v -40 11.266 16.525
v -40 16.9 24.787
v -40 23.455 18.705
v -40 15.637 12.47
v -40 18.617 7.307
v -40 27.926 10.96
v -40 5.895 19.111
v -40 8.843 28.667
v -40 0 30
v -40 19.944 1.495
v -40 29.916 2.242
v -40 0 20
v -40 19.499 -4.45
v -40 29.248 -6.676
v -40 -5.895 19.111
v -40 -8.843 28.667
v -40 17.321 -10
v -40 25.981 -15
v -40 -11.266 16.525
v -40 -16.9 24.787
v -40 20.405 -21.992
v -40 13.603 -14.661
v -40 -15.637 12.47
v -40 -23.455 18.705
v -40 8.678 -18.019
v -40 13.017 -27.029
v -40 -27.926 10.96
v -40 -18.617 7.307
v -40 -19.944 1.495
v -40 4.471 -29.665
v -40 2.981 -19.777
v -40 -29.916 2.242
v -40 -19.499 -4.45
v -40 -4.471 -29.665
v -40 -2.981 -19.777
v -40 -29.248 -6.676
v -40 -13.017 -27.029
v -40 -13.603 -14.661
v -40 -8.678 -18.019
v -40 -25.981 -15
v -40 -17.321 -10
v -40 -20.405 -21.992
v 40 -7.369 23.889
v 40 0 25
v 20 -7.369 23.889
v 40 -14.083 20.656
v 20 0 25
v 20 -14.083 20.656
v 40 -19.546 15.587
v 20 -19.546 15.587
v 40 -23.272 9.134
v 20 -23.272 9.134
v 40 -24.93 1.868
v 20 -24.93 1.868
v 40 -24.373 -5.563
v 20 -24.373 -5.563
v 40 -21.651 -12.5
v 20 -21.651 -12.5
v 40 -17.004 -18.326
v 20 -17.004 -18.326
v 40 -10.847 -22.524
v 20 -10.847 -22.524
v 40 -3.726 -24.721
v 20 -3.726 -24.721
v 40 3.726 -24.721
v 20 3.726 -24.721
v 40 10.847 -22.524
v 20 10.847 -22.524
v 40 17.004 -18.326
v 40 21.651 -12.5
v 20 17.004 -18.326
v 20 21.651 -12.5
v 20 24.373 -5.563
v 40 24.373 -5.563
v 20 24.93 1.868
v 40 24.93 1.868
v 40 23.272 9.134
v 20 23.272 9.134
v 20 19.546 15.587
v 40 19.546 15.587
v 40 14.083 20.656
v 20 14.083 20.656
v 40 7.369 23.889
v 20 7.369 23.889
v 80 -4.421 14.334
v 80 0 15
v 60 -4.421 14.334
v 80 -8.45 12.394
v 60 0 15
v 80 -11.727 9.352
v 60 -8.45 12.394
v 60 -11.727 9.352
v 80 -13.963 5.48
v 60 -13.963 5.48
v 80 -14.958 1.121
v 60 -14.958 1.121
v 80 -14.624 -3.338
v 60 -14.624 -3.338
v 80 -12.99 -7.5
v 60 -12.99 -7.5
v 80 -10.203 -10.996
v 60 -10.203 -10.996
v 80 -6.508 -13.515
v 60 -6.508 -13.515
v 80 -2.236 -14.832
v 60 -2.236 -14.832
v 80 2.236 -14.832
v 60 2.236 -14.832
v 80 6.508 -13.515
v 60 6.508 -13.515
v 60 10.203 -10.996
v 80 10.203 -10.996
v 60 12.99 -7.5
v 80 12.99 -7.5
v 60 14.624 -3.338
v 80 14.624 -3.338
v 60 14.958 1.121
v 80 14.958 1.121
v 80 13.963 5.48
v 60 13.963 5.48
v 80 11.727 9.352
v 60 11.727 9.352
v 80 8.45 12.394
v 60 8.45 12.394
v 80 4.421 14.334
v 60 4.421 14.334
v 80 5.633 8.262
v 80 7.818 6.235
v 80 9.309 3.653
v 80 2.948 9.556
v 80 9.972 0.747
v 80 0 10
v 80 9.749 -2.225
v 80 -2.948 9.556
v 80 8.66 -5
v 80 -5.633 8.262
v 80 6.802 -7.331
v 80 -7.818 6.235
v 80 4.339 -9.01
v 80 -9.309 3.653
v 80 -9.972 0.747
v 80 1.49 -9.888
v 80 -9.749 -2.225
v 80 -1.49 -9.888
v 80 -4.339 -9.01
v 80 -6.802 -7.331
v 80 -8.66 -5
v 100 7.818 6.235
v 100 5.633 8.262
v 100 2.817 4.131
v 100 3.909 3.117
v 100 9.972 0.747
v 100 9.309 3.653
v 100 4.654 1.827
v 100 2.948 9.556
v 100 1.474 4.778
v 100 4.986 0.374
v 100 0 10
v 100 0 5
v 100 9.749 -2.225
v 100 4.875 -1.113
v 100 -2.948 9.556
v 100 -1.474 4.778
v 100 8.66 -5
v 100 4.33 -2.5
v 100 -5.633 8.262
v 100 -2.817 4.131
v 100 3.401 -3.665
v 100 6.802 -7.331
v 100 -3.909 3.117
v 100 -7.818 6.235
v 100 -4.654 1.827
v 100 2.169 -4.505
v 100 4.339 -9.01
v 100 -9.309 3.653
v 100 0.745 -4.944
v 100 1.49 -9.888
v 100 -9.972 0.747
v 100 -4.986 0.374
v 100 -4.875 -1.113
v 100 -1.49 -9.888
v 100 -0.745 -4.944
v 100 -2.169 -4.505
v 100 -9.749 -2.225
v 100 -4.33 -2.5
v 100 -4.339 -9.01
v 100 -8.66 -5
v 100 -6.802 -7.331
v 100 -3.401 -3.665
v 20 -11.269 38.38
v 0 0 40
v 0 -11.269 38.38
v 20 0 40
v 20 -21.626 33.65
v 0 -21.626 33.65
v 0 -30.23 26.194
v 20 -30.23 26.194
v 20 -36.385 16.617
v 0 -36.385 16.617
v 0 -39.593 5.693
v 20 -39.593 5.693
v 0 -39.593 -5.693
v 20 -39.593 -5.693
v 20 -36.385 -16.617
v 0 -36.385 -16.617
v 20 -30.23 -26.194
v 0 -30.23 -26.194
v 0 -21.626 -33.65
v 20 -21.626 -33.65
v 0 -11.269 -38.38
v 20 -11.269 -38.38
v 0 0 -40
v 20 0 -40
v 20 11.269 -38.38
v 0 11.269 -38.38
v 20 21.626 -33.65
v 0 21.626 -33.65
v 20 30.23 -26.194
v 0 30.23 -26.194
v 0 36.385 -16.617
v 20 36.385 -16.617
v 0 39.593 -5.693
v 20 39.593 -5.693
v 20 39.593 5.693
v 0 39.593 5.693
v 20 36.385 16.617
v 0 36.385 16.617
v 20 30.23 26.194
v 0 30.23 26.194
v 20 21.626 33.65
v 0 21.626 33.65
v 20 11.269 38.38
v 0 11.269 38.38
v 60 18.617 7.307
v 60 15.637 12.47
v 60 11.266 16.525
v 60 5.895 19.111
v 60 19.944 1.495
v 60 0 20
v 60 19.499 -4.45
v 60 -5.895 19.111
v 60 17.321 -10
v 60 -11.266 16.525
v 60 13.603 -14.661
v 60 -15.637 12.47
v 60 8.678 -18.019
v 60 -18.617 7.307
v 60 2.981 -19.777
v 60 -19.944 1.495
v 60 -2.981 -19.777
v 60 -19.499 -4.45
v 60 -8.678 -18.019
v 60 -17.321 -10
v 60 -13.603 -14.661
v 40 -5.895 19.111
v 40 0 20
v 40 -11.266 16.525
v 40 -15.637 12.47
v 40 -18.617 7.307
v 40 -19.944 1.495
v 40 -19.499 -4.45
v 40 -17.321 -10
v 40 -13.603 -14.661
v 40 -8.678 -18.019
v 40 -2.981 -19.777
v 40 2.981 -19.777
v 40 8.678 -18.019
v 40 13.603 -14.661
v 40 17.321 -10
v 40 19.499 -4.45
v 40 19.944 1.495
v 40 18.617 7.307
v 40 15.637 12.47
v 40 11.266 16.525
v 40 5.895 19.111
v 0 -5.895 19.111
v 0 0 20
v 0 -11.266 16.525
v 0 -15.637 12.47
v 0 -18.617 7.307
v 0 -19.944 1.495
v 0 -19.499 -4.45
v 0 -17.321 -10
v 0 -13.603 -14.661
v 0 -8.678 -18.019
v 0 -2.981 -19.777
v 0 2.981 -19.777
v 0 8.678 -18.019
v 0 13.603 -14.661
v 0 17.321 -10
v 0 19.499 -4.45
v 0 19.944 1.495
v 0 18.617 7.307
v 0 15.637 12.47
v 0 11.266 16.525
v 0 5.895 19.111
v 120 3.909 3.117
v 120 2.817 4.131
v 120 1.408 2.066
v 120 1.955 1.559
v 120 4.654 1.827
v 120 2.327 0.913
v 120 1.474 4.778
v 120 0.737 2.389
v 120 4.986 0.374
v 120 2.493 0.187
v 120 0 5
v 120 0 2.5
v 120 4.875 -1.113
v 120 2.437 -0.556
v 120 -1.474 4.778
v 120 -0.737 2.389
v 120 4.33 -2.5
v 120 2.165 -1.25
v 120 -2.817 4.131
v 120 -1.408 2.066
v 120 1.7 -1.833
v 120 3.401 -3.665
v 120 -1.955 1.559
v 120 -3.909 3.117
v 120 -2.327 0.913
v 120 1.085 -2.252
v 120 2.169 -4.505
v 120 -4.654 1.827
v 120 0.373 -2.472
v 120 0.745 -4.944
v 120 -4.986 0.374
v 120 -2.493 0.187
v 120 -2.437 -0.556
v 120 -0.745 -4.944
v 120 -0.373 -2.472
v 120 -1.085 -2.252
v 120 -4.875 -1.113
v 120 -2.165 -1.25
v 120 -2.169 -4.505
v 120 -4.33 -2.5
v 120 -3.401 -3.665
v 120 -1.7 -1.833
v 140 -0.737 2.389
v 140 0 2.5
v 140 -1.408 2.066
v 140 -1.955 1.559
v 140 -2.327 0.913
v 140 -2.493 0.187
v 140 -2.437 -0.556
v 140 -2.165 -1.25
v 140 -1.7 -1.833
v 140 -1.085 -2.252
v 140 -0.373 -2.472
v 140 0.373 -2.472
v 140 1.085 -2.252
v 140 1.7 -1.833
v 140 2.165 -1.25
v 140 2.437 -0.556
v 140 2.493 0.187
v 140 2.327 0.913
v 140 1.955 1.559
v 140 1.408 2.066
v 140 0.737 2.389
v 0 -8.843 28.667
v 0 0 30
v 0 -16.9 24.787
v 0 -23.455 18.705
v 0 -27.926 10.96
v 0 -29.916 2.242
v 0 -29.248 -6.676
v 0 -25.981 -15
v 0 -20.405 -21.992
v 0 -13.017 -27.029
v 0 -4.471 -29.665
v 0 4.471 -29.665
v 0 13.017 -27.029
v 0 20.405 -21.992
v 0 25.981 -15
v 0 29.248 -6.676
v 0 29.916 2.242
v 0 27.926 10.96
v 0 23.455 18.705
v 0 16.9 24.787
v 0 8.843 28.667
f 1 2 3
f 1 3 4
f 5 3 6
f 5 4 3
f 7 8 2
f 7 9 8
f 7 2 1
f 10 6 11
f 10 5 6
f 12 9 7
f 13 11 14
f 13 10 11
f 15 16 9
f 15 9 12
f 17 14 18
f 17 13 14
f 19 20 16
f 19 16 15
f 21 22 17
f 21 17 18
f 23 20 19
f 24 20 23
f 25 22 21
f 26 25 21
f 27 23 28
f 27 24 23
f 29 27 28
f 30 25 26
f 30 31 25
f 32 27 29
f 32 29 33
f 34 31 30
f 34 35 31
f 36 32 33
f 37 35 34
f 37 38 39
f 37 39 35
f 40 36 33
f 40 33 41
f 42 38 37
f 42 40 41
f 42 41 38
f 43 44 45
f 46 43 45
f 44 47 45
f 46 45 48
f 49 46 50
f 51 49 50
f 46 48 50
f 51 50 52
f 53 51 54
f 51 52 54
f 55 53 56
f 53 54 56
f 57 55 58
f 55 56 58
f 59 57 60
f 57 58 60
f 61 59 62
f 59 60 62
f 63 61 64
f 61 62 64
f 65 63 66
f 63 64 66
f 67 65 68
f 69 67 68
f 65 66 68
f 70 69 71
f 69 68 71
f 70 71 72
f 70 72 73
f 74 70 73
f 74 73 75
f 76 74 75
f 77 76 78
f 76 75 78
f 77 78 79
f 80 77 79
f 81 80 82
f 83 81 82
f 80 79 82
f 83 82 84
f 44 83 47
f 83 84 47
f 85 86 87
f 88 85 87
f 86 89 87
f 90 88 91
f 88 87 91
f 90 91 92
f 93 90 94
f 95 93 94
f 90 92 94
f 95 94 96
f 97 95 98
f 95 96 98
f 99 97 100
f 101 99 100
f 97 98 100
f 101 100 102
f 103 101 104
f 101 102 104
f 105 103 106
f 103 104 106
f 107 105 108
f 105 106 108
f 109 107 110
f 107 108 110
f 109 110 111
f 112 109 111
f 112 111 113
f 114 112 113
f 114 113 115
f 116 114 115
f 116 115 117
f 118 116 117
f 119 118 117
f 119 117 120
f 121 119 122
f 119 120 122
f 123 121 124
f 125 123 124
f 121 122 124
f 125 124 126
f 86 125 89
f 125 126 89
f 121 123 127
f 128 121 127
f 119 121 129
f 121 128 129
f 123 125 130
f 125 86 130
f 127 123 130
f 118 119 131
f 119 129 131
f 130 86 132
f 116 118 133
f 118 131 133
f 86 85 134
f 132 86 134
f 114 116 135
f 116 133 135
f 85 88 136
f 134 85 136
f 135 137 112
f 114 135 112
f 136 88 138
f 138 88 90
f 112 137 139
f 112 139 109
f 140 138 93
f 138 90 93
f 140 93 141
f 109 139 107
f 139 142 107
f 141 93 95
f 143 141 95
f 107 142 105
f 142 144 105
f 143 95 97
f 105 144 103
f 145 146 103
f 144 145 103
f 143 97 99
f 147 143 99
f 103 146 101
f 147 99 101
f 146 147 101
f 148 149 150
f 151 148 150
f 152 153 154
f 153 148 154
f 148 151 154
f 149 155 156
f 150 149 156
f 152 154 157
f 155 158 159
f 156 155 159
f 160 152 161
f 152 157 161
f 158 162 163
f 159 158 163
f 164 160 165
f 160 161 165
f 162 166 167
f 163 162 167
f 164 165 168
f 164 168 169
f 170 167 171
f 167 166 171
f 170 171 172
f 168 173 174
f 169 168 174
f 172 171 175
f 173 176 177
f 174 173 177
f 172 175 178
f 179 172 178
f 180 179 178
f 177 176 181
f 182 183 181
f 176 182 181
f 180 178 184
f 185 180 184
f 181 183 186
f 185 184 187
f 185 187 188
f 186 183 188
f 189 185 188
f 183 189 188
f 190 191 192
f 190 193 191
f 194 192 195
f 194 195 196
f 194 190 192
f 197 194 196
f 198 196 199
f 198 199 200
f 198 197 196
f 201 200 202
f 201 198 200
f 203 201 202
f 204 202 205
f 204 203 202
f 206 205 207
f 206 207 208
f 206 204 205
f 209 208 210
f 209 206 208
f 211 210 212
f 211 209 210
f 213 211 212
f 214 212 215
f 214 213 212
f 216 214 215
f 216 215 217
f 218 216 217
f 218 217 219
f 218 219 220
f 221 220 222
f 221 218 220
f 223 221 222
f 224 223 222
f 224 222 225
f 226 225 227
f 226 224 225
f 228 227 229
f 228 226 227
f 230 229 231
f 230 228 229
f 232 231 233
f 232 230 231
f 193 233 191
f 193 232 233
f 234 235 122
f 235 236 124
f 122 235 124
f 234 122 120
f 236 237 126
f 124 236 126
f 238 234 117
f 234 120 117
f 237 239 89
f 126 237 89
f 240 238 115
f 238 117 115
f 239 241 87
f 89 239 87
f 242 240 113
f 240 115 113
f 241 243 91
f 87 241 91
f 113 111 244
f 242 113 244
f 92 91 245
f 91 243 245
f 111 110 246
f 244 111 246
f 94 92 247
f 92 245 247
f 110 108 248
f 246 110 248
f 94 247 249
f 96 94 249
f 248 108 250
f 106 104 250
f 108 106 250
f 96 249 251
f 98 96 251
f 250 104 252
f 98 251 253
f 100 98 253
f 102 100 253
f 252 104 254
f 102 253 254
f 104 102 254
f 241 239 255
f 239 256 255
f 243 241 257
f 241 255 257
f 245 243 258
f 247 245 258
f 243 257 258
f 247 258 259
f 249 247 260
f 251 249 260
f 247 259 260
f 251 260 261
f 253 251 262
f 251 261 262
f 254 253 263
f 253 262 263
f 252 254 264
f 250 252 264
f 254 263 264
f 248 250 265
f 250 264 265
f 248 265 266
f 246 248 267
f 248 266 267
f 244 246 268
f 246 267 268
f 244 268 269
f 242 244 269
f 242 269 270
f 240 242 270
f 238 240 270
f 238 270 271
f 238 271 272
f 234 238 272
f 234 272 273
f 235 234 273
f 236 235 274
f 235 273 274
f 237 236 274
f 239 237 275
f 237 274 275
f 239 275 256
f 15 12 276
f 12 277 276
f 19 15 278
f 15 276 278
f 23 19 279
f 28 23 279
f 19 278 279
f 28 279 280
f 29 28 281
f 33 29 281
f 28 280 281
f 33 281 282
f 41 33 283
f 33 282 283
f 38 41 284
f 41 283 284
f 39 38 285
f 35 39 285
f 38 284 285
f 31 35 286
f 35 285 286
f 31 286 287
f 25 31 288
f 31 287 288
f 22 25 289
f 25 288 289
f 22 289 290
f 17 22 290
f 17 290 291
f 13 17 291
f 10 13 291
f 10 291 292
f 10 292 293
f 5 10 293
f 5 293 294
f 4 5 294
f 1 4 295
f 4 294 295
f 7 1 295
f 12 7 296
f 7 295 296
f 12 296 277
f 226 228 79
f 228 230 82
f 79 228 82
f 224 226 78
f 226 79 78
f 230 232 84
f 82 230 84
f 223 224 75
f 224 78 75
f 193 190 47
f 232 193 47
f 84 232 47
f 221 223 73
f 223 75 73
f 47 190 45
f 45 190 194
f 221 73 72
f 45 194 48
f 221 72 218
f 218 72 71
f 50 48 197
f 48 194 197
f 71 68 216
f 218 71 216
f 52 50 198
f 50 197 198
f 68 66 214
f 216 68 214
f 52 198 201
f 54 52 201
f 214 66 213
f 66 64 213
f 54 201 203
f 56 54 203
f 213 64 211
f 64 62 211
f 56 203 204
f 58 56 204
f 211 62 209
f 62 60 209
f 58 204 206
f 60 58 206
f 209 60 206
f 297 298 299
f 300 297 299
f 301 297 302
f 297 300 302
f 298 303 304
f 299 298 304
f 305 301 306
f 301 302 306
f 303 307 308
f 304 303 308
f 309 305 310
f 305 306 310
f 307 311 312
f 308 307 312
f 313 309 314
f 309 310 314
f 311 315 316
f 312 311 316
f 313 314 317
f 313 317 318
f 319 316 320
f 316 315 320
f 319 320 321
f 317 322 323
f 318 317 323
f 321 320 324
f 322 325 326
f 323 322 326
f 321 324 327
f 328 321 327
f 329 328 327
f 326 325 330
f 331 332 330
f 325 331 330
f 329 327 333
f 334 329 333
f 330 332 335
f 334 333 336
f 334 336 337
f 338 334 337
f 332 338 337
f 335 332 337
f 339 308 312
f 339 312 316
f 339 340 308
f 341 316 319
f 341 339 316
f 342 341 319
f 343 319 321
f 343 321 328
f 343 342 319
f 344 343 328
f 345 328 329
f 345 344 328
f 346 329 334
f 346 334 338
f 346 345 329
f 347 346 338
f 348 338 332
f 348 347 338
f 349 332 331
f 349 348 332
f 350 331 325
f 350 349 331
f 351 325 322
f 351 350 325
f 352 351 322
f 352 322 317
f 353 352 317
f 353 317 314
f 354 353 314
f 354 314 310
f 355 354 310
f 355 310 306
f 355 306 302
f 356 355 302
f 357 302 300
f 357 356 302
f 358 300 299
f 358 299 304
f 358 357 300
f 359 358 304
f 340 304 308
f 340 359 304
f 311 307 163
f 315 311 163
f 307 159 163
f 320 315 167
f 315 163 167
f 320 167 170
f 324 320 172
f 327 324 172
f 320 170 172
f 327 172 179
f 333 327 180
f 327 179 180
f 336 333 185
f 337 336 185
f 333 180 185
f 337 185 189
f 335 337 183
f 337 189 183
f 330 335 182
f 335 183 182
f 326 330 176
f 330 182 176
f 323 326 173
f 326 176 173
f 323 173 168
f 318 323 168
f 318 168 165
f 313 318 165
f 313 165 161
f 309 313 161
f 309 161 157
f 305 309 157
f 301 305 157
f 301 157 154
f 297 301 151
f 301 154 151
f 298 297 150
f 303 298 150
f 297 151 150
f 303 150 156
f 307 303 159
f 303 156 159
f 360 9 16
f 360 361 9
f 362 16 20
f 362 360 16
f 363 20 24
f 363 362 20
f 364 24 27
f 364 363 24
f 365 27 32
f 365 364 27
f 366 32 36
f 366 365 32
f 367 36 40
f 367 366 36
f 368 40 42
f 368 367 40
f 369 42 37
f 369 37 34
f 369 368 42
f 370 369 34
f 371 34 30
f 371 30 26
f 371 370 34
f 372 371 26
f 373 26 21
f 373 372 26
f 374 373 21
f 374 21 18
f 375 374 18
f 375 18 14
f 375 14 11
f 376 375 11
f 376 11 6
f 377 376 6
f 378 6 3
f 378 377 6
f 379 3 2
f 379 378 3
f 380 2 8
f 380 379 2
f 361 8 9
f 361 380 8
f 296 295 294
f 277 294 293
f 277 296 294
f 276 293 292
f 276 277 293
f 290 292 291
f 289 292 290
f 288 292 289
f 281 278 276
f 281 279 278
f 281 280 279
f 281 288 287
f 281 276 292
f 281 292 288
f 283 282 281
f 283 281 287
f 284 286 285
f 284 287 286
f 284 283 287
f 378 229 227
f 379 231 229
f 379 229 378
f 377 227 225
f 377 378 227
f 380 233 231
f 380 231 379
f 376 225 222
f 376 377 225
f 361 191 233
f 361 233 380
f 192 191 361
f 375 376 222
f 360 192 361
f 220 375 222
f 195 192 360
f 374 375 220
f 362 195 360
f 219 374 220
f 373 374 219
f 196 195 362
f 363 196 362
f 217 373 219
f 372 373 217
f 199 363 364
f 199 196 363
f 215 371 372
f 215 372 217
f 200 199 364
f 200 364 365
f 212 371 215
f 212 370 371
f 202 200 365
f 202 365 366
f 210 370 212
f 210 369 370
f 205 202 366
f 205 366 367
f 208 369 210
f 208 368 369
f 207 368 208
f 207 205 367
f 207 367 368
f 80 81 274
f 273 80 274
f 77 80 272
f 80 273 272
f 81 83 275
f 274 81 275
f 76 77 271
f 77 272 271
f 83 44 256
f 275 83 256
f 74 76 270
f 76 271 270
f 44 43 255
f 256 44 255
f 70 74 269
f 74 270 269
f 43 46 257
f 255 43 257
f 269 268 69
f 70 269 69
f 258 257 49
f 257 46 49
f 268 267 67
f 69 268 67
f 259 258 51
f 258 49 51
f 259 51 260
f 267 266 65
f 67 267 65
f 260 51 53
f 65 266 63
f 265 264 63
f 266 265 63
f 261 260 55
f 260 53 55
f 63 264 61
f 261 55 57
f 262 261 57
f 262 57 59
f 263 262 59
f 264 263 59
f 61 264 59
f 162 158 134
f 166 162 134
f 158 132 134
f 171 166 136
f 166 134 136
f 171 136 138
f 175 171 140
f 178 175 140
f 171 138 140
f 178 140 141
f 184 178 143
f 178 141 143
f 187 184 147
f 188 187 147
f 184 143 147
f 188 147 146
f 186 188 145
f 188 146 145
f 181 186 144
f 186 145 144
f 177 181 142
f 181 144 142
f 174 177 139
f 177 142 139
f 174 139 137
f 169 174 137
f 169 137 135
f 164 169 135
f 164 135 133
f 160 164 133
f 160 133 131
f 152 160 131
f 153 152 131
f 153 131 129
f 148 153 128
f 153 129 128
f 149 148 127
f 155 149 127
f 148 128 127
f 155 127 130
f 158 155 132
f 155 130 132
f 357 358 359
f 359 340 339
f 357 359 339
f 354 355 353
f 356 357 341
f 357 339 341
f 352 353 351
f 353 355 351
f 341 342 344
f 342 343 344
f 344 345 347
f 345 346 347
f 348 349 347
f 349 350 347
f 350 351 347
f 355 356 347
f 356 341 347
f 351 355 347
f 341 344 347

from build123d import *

# Parameters (mm, degrees)
SKETCH_1_W   = 40
SKETCH_1_H   = 10
SKETCH_1_W_2 = 20
SKETCH_1_H_2 = 40
SKETCH_1_H_3 = 2.5


with BuildPart() as part:
    # 草圖1 → 旋轉1 (revolve)
    with BuildSketch(Plane.XY, mode=Mode.PRIVATE) as revolve_1_sk:
        with Locations((-20, 25)):
            Rectangle(SKETCH_1_W, SKETCH_1_H)
        with Locations((10, 20)):
            Rectangle(SKETCH_1_W_2, SKETCH_1_H_2)
        Polygon((20, 25), (20, 0), (40, 0), (40, 20), (40, 25), align=None)
        Polygon((40, 20), (40, 0), (60, 0), (60, 15), (60, 20), align=None)
        Polygon((60, 15), (60, 0), (80, 0), (80, 10), (80, 15), align=None)
        Polygon((80, 10), (80, 0), (100, 0), (100, 5), (100, 10), align=None)
        Polygon((100, 5), (100, 0), (120, 0), (120, 2.5), (120, 5), align=None)
        with Locations((130, 1.25)):
            Rectangle(SKETCH_1_W_2, SKETCH_1_H_3)
    revolve(revolve_1_sk.sketch.rotate(Axis((0, 0, 0), (1, 0, 0)), 90), axis=Axis((0, 0, 0), (1, 0, 0)))


solid = part.part
